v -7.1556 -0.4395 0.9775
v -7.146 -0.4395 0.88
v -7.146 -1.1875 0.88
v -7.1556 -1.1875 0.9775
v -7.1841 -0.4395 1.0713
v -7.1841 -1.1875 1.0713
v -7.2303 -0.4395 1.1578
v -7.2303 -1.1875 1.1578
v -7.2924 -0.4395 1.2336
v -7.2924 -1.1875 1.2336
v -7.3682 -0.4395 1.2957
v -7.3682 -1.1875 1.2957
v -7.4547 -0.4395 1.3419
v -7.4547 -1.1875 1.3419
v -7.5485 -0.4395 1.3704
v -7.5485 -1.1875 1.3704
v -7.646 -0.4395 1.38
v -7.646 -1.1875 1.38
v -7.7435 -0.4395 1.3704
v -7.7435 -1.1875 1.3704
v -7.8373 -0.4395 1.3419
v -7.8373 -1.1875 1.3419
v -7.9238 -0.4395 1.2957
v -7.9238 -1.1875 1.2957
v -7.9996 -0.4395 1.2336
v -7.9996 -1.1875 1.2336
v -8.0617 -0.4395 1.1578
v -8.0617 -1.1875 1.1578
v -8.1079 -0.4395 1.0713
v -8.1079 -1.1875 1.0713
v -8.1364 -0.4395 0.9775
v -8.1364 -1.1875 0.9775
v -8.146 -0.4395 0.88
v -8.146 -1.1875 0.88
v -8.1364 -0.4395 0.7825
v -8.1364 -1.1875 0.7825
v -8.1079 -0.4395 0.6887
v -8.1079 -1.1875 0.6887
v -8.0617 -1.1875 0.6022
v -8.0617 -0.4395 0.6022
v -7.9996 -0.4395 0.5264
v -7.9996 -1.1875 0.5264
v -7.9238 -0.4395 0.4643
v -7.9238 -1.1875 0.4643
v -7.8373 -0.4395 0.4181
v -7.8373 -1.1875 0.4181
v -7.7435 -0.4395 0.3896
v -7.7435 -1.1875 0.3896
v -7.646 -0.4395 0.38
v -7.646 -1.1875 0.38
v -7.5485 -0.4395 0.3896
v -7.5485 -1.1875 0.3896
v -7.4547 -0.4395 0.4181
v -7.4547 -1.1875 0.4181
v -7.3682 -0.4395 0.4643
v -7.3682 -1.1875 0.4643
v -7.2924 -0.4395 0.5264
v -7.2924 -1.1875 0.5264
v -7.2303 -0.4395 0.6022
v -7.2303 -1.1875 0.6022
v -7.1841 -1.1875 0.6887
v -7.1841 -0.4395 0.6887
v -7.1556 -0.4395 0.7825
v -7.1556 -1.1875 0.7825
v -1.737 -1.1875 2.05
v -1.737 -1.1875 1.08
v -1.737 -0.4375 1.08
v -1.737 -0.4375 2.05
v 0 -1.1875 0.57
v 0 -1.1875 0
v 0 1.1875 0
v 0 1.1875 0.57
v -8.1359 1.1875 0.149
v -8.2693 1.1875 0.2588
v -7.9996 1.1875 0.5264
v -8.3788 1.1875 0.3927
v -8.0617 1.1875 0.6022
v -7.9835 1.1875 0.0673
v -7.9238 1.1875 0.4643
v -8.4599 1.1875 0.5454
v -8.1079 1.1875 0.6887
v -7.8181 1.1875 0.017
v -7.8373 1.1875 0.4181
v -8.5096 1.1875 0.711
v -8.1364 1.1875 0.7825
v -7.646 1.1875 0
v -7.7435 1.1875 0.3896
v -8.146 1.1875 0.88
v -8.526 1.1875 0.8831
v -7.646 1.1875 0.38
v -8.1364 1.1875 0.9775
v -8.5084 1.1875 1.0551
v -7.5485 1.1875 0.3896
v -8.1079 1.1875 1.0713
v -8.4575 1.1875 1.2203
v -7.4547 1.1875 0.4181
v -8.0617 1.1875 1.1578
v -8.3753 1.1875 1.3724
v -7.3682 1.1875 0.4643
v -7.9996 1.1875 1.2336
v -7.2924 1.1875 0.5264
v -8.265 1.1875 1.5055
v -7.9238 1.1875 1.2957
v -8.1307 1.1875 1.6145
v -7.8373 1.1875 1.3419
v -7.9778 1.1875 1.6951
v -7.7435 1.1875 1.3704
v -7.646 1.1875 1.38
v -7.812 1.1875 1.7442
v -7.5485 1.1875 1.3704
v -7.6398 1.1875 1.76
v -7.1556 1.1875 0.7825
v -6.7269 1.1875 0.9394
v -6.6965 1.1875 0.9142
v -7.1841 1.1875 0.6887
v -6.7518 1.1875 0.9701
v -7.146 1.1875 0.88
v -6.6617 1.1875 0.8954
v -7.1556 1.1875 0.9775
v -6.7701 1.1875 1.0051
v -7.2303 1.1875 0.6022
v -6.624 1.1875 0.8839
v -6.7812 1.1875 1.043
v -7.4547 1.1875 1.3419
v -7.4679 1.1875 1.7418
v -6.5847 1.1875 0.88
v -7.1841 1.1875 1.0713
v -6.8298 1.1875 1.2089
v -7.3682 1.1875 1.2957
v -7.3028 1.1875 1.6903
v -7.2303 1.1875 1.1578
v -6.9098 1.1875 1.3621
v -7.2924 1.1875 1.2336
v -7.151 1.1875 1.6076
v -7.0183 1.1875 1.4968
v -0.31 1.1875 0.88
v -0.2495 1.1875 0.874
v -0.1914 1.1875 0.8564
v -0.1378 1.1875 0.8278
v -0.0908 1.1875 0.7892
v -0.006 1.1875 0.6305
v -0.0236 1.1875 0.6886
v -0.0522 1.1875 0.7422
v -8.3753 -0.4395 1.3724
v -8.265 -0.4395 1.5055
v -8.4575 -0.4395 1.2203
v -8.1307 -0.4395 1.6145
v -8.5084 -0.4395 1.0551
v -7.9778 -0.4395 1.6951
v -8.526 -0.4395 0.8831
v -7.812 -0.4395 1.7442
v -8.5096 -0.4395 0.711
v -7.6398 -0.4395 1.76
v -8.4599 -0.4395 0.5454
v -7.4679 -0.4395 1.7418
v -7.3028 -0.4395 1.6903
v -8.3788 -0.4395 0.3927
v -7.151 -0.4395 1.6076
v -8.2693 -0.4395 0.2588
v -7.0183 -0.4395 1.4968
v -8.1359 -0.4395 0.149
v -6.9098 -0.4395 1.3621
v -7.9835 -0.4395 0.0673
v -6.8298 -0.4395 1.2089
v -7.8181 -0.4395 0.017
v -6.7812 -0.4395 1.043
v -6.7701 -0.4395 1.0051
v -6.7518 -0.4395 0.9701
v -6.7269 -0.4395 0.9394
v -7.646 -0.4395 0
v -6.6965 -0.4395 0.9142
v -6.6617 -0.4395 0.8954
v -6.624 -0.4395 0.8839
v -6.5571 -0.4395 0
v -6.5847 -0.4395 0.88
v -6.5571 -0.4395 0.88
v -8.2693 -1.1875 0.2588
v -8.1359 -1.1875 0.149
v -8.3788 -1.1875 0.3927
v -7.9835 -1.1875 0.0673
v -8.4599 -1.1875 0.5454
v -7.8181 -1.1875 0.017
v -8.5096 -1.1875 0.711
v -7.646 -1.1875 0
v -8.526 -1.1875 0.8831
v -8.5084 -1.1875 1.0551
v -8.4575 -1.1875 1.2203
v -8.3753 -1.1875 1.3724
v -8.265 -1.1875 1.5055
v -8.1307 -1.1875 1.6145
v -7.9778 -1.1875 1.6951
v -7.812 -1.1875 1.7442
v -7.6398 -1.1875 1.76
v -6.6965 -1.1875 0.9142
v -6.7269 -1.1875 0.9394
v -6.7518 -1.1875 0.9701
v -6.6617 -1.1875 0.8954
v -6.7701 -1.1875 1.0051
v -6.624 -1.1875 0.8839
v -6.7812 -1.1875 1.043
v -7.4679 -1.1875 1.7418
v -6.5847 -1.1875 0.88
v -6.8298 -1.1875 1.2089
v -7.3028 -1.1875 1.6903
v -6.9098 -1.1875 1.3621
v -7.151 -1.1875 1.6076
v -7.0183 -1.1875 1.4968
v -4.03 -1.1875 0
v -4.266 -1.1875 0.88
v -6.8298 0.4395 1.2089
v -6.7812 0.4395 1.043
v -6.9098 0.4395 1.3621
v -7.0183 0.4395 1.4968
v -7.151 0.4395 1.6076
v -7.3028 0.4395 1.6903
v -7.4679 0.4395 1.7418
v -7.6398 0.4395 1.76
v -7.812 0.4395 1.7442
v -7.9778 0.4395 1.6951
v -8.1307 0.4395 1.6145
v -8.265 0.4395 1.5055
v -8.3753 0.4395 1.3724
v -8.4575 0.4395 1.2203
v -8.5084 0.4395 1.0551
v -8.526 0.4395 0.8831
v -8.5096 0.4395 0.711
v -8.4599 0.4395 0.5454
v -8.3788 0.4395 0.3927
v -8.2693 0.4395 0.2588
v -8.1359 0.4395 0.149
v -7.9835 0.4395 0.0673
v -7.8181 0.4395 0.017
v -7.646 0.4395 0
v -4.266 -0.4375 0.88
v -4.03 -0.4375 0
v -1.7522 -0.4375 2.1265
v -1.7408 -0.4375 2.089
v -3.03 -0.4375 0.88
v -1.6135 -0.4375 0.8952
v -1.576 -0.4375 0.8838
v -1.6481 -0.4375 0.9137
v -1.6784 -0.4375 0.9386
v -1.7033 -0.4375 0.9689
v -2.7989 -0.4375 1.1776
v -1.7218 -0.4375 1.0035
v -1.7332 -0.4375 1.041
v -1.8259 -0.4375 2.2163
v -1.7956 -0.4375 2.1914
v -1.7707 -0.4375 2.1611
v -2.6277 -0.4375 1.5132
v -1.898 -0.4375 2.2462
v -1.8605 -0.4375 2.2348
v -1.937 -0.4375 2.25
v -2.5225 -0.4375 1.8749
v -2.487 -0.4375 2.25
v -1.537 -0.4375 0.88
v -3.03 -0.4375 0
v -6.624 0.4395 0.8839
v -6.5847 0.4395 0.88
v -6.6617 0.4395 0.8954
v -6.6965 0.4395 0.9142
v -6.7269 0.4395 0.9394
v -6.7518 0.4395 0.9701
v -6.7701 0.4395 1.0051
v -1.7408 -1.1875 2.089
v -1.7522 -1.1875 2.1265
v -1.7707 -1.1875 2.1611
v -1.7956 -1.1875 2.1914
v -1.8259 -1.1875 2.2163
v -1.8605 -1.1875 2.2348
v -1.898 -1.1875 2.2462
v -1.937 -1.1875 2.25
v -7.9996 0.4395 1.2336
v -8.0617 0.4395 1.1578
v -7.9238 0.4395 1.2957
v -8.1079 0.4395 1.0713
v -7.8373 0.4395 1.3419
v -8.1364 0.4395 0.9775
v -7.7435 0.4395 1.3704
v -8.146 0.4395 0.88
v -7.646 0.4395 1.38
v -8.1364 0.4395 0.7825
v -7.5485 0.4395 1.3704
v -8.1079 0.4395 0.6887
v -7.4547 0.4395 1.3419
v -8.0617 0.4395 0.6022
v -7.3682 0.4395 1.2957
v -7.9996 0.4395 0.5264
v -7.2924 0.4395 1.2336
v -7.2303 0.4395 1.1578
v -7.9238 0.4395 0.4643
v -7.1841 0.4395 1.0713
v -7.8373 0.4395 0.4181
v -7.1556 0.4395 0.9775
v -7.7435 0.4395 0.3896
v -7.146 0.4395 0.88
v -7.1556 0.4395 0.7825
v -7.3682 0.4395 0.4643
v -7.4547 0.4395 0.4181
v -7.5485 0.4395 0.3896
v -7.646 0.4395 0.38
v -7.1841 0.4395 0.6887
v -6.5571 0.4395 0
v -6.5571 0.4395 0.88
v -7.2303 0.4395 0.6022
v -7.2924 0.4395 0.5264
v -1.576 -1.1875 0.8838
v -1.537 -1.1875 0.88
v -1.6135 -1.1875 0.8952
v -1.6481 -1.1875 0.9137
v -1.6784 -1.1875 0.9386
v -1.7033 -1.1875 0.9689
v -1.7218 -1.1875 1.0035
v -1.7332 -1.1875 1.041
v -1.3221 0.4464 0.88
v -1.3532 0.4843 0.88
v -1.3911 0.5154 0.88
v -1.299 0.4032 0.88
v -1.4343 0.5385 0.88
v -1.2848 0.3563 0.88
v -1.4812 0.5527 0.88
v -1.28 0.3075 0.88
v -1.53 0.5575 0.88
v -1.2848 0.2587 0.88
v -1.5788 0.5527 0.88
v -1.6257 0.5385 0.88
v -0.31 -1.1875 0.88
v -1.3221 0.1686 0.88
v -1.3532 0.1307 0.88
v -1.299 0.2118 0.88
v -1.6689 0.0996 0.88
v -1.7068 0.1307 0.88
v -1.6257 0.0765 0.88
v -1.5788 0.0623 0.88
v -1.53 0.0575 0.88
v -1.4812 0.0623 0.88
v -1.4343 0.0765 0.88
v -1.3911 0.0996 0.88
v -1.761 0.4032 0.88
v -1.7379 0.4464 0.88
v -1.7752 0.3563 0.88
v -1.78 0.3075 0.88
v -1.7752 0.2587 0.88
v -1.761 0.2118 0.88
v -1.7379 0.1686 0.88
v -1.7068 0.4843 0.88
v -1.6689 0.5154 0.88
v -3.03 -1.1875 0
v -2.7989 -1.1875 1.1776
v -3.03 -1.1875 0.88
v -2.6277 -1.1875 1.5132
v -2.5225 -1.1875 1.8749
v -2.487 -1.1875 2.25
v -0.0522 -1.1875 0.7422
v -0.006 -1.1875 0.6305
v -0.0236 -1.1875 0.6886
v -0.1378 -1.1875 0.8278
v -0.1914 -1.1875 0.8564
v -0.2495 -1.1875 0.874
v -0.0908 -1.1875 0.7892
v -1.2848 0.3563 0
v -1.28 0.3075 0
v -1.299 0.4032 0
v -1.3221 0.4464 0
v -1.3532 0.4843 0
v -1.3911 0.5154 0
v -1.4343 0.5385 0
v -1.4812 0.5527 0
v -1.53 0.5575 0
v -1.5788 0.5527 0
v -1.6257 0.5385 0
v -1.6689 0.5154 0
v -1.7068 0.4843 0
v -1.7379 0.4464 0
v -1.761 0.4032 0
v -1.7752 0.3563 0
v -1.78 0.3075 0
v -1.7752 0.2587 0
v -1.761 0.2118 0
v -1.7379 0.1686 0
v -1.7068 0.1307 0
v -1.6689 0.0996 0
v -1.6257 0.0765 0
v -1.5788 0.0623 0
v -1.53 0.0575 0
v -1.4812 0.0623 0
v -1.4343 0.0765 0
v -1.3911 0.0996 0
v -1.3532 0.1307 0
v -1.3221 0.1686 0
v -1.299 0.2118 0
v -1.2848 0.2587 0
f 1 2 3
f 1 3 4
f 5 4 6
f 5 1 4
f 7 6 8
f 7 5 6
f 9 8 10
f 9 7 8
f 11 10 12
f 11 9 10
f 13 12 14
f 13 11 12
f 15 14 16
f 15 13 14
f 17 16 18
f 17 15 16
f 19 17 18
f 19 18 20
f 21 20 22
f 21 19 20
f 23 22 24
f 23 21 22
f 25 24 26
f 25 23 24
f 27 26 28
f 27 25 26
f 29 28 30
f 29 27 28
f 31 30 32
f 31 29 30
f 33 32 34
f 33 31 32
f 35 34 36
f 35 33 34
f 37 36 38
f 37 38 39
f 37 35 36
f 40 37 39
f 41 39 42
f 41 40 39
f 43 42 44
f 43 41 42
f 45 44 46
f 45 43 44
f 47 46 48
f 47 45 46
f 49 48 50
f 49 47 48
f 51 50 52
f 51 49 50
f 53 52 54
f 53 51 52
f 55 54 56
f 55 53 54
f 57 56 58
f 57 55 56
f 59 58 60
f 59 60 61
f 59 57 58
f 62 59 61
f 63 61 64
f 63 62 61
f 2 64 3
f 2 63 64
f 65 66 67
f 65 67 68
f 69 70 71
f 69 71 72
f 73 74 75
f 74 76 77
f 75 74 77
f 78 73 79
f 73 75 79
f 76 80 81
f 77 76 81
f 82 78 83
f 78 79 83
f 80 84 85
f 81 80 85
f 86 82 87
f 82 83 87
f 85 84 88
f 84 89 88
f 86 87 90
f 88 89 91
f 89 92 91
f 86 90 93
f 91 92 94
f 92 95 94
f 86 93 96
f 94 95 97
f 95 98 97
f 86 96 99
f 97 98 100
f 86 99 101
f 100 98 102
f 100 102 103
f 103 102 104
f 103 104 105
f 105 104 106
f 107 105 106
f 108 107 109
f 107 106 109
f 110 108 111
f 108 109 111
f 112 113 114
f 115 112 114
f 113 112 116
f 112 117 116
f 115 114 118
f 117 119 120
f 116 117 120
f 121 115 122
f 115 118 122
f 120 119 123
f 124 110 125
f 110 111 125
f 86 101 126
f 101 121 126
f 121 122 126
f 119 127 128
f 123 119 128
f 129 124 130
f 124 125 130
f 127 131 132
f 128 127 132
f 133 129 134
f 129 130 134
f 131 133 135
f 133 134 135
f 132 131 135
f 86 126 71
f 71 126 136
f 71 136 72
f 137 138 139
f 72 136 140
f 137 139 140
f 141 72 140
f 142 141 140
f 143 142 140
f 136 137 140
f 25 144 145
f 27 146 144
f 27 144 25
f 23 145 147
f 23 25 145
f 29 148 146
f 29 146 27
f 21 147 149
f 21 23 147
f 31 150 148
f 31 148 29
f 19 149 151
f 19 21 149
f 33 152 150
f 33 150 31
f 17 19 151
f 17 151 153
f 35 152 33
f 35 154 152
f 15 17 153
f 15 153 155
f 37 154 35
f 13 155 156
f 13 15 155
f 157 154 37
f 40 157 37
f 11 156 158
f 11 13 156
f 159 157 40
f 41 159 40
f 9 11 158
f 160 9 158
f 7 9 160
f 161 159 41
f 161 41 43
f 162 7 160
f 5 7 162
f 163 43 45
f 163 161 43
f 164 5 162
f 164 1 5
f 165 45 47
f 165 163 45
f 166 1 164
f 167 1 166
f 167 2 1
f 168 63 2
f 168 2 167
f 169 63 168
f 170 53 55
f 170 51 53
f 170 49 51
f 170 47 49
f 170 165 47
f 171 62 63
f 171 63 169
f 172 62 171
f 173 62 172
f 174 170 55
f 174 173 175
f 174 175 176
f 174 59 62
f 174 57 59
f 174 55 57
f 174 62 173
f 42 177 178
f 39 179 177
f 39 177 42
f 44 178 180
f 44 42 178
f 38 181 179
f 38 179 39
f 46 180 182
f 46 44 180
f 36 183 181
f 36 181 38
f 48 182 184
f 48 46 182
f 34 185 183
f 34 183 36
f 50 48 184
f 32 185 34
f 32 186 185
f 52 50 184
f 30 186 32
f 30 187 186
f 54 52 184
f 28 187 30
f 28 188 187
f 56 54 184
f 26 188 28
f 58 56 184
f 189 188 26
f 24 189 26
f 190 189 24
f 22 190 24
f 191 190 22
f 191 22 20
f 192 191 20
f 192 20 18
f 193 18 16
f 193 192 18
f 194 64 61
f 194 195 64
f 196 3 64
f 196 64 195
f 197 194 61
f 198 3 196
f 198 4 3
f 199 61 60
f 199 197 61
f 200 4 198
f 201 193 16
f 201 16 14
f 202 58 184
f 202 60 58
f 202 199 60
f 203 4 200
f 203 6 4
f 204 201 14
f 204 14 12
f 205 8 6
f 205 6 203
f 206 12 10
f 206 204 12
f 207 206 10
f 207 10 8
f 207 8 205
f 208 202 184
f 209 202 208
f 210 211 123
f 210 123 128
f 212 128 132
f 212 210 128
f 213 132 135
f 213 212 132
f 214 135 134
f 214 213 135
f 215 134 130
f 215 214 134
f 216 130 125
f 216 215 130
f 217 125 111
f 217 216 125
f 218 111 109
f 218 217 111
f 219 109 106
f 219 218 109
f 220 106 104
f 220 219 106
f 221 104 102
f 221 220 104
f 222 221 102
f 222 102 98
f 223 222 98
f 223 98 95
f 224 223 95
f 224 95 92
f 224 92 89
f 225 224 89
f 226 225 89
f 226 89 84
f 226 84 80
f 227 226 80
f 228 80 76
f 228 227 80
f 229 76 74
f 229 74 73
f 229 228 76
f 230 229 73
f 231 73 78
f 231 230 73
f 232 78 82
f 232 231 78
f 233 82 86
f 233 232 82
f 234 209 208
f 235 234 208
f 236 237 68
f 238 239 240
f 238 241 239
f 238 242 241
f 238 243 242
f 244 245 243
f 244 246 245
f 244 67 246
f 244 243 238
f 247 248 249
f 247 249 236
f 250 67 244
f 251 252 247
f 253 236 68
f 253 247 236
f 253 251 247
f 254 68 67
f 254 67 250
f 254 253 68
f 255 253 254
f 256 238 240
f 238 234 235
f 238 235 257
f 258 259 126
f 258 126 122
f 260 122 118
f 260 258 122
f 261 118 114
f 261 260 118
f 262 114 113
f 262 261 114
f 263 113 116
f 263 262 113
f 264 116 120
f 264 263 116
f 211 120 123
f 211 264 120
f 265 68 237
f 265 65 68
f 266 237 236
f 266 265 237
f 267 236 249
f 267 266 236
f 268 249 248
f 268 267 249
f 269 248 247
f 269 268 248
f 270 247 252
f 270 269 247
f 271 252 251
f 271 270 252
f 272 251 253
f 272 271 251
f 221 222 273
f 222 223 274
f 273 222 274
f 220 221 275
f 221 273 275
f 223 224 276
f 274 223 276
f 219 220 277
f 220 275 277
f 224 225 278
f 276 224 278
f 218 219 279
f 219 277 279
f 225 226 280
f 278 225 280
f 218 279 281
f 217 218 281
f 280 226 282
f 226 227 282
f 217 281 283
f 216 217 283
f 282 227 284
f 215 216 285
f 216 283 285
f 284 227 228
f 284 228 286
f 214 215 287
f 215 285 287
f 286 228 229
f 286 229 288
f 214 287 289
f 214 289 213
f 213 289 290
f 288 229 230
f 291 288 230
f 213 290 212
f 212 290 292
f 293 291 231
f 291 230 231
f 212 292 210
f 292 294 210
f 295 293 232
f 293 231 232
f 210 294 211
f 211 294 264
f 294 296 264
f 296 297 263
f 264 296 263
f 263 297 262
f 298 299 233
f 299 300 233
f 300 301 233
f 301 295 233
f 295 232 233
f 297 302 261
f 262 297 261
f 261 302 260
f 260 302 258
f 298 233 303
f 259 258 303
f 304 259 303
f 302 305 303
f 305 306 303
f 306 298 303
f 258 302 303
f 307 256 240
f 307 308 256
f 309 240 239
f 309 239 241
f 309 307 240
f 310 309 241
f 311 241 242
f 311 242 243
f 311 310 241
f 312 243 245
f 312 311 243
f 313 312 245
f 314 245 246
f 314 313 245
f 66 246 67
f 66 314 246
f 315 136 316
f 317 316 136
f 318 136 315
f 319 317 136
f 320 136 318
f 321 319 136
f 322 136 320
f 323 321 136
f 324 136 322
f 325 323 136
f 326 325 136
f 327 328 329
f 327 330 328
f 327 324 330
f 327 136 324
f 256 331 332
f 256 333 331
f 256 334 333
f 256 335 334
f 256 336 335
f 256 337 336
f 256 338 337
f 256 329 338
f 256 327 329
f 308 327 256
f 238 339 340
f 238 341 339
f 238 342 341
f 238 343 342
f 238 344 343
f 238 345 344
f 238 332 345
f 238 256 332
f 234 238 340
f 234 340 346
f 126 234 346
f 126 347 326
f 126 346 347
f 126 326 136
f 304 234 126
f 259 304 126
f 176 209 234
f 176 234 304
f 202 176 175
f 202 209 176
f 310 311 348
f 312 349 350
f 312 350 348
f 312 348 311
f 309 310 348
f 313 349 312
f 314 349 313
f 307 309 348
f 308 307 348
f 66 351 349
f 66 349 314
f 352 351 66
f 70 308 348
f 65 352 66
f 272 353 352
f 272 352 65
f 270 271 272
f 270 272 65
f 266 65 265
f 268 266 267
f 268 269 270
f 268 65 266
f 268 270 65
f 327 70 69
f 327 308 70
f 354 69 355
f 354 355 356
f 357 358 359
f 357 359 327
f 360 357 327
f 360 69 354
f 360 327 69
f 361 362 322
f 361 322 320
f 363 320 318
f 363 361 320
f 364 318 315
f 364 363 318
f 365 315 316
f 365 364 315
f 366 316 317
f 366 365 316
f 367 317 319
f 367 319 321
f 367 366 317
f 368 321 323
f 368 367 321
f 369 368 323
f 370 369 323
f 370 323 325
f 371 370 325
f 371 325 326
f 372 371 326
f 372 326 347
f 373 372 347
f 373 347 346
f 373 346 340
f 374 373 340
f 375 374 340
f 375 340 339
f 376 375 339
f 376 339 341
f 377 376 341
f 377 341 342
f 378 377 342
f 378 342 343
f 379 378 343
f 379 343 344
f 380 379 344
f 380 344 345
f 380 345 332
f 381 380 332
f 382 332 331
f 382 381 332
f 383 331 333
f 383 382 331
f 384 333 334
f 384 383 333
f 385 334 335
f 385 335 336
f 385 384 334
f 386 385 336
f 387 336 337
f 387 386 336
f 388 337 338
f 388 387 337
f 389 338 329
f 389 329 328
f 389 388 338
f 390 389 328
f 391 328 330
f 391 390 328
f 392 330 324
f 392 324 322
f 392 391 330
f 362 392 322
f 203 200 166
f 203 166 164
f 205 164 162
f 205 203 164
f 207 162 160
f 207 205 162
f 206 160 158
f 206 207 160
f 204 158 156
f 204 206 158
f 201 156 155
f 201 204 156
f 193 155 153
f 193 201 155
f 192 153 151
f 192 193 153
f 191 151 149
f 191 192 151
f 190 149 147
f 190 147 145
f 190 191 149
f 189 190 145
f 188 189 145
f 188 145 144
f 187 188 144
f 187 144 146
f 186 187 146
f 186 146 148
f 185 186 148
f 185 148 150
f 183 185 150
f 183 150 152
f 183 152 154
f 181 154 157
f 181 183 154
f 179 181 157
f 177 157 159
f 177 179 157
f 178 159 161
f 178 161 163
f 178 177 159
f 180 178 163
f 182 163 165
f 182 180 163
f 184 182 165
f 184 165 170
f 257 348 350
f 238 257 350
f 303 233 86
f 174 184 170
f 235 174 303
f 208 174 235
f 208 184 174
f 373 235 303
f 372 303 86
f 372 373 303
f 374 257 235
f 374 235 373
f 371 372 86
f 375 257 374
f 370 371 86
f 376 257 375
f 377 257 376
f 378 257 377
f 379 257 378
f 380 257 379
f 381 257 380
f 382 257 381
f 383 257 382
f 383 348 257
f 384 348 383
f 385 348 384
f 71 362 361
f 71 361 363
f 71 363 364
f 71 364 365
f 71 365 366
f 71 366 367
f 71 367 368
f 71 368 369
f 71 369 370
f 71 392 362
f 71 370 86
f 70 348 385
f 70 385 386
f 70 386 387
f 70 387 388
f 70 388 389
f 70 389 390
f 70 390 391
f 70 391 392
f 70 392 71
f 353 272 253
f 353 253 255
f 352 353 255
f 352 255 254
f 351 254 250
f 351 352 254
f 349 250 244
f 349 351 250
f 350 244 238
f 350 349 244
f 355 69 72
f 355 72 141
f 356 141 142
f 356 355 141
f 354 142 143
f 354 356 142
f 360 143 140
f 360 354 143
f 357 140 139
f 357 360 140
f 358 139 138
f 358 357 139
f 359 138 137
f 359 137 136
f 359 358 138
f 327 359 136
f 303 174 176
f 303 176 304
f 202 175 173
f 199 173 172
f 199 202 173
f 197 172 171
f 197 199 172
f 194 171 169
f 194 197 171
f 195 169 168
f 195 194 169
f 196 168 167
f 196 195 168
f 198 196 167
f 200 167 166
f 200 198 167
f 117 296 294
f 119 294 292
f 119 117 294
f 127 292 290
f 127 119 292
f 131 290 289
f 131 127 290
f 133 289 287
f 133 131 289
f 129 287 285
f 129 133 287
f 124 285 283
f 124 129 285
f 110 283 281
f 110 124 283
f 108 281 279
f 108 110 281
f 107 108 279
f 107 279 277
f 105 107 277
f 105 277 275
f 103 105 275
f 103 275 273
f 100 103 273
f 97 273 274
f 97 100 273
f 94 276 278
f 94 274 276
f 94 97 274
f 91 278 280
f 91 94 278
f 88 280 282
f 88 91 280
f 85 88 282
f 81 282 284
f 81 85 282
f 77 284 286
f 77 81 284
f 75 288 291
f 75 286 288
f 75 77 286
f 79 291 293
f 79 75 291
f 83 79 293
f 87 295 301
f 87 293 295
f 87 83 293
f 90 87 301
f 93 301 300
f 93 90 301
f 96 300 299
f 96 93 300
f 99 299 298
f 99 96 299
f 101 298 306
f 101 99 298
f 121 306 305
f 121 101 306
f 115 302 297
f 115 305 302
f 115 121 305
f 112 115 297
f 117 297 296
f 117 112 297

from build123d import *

# Parameters (mm, degrees)
F0_R     = 0.5
F1_DEPTH = 1.1875
F2_W     = 2.274463
F2_H     = 0.879
F2_R     = 0.25
F3_DEPTH = 2.251
F5_DEPTH = 1.625
F7_DEPTH = 0.75
F8_R     = 0.2


with BuildPart() as f1:
    # F0 (on Front) → F1 (new body, symmetric)
    with BuildSketch(Plane.XZ):
        Polygon((-4.03, 0), (-3.03, 0), (-3.03, 0.88), (-4.266, 0.88), align=None)
        with BuildLine():
            Line((-7.646, 0), (-4.03, 0))
            Line((-4.03, 0), (-4.266, 0.88))
            Line((-4.266, 0.88), (-6.58468, 0.88))
            ThreePointArc((-6.58468, 0.88), (-6.712337, 0.92604), (-6.781221, 1.042963))
            ThreePointArc((-6.781221, 1.042963), (-8.323424, 1.441691), (-7.646, 0))
        make_face()
        with Locations((-7.646, 0.88)):
            Circle(F0_R, mode=Mode.SUBTRACT)
        with BuildLine():
            Line((-3.03, 0), (0, 0))
            Line((0, 0), (0, 0.57))
            ThreePointArc((0, 0.57), (-0.090797, 0.789203), (-0.31, 0.88))
            Line((-0.31, 0.88), (-1.737, 0.88))
            Line((-1.737, 0.88), (-1.737, 2.05))
            ThreePointArc((-1.737, 2.05), (-1.795579, 2.191421), (-1.937, 2.25))
            Line((-1.937, 2.25), (-2.487, 2.25))
            ThreePointArc((-2.487, 2.25), (-2.627716, 1.513164), (-3.03, 0.88))
            Line((-3.03, 0.88), (-3.03, 0))
        make_face()
    extrude(amount=F1_DEPTH, both=True)

    # F2 (on Top) → F3 (cut, through all)
    with BuildSketch(Plane.XY):
        with Locations((-7.694299, 0)):
            Rectangle(F2_W, F2_H)
        with Locations((-1.53, 0.3075)):
            Circle(F2_R)
    extrude(amount=F3_DEPTH, mode=Mode.SUBTRACT)

    # F4 (on face) → F5 (cut)
    with BuildSketch(Plane(origin=(0, 1.1875, 0), x_dir=(-1, 0, 0), z_dir=(0, 1, 0))):
        with BuildLine():
            Line((1.737, 0.88), (3.03, 0.88))
            ThreePointArc((3.03, 0.88), (2.627716, 1.513164), (2.487, 2.25))
            Line((2.487, 2.25), (1.937, 2.25))
            ThreePointArc((1.937, 2.25), (1.795579, 2.191421), (1.737, 2.05))
            Line((1.737, 2.05), (1.737, 0.88))
        make_face()
    extrude(amount=-F5_DEPTH, mode=Mode.SUBTRACT)

    # F6 (on face) → F7 (cut)
    with BuildSketch(Plane.XZ.offset(1.1875)):
        Polygon((-3.03, 0), (-3.03, 0.88), (-4.266, 0.88), (-4.03, 0), align=None)
    extrude(amount=-F7_DEPTH, mode=Mode.SUBTRACT)

    # F8
    f8_edges = [f1.edges().sort_by_distance(p)[0] for p in [
        (-1.737, -0.8125, 0.88),
    ]]
    fillet(f8_edges, radius=F8_R)


solid = f1.part
